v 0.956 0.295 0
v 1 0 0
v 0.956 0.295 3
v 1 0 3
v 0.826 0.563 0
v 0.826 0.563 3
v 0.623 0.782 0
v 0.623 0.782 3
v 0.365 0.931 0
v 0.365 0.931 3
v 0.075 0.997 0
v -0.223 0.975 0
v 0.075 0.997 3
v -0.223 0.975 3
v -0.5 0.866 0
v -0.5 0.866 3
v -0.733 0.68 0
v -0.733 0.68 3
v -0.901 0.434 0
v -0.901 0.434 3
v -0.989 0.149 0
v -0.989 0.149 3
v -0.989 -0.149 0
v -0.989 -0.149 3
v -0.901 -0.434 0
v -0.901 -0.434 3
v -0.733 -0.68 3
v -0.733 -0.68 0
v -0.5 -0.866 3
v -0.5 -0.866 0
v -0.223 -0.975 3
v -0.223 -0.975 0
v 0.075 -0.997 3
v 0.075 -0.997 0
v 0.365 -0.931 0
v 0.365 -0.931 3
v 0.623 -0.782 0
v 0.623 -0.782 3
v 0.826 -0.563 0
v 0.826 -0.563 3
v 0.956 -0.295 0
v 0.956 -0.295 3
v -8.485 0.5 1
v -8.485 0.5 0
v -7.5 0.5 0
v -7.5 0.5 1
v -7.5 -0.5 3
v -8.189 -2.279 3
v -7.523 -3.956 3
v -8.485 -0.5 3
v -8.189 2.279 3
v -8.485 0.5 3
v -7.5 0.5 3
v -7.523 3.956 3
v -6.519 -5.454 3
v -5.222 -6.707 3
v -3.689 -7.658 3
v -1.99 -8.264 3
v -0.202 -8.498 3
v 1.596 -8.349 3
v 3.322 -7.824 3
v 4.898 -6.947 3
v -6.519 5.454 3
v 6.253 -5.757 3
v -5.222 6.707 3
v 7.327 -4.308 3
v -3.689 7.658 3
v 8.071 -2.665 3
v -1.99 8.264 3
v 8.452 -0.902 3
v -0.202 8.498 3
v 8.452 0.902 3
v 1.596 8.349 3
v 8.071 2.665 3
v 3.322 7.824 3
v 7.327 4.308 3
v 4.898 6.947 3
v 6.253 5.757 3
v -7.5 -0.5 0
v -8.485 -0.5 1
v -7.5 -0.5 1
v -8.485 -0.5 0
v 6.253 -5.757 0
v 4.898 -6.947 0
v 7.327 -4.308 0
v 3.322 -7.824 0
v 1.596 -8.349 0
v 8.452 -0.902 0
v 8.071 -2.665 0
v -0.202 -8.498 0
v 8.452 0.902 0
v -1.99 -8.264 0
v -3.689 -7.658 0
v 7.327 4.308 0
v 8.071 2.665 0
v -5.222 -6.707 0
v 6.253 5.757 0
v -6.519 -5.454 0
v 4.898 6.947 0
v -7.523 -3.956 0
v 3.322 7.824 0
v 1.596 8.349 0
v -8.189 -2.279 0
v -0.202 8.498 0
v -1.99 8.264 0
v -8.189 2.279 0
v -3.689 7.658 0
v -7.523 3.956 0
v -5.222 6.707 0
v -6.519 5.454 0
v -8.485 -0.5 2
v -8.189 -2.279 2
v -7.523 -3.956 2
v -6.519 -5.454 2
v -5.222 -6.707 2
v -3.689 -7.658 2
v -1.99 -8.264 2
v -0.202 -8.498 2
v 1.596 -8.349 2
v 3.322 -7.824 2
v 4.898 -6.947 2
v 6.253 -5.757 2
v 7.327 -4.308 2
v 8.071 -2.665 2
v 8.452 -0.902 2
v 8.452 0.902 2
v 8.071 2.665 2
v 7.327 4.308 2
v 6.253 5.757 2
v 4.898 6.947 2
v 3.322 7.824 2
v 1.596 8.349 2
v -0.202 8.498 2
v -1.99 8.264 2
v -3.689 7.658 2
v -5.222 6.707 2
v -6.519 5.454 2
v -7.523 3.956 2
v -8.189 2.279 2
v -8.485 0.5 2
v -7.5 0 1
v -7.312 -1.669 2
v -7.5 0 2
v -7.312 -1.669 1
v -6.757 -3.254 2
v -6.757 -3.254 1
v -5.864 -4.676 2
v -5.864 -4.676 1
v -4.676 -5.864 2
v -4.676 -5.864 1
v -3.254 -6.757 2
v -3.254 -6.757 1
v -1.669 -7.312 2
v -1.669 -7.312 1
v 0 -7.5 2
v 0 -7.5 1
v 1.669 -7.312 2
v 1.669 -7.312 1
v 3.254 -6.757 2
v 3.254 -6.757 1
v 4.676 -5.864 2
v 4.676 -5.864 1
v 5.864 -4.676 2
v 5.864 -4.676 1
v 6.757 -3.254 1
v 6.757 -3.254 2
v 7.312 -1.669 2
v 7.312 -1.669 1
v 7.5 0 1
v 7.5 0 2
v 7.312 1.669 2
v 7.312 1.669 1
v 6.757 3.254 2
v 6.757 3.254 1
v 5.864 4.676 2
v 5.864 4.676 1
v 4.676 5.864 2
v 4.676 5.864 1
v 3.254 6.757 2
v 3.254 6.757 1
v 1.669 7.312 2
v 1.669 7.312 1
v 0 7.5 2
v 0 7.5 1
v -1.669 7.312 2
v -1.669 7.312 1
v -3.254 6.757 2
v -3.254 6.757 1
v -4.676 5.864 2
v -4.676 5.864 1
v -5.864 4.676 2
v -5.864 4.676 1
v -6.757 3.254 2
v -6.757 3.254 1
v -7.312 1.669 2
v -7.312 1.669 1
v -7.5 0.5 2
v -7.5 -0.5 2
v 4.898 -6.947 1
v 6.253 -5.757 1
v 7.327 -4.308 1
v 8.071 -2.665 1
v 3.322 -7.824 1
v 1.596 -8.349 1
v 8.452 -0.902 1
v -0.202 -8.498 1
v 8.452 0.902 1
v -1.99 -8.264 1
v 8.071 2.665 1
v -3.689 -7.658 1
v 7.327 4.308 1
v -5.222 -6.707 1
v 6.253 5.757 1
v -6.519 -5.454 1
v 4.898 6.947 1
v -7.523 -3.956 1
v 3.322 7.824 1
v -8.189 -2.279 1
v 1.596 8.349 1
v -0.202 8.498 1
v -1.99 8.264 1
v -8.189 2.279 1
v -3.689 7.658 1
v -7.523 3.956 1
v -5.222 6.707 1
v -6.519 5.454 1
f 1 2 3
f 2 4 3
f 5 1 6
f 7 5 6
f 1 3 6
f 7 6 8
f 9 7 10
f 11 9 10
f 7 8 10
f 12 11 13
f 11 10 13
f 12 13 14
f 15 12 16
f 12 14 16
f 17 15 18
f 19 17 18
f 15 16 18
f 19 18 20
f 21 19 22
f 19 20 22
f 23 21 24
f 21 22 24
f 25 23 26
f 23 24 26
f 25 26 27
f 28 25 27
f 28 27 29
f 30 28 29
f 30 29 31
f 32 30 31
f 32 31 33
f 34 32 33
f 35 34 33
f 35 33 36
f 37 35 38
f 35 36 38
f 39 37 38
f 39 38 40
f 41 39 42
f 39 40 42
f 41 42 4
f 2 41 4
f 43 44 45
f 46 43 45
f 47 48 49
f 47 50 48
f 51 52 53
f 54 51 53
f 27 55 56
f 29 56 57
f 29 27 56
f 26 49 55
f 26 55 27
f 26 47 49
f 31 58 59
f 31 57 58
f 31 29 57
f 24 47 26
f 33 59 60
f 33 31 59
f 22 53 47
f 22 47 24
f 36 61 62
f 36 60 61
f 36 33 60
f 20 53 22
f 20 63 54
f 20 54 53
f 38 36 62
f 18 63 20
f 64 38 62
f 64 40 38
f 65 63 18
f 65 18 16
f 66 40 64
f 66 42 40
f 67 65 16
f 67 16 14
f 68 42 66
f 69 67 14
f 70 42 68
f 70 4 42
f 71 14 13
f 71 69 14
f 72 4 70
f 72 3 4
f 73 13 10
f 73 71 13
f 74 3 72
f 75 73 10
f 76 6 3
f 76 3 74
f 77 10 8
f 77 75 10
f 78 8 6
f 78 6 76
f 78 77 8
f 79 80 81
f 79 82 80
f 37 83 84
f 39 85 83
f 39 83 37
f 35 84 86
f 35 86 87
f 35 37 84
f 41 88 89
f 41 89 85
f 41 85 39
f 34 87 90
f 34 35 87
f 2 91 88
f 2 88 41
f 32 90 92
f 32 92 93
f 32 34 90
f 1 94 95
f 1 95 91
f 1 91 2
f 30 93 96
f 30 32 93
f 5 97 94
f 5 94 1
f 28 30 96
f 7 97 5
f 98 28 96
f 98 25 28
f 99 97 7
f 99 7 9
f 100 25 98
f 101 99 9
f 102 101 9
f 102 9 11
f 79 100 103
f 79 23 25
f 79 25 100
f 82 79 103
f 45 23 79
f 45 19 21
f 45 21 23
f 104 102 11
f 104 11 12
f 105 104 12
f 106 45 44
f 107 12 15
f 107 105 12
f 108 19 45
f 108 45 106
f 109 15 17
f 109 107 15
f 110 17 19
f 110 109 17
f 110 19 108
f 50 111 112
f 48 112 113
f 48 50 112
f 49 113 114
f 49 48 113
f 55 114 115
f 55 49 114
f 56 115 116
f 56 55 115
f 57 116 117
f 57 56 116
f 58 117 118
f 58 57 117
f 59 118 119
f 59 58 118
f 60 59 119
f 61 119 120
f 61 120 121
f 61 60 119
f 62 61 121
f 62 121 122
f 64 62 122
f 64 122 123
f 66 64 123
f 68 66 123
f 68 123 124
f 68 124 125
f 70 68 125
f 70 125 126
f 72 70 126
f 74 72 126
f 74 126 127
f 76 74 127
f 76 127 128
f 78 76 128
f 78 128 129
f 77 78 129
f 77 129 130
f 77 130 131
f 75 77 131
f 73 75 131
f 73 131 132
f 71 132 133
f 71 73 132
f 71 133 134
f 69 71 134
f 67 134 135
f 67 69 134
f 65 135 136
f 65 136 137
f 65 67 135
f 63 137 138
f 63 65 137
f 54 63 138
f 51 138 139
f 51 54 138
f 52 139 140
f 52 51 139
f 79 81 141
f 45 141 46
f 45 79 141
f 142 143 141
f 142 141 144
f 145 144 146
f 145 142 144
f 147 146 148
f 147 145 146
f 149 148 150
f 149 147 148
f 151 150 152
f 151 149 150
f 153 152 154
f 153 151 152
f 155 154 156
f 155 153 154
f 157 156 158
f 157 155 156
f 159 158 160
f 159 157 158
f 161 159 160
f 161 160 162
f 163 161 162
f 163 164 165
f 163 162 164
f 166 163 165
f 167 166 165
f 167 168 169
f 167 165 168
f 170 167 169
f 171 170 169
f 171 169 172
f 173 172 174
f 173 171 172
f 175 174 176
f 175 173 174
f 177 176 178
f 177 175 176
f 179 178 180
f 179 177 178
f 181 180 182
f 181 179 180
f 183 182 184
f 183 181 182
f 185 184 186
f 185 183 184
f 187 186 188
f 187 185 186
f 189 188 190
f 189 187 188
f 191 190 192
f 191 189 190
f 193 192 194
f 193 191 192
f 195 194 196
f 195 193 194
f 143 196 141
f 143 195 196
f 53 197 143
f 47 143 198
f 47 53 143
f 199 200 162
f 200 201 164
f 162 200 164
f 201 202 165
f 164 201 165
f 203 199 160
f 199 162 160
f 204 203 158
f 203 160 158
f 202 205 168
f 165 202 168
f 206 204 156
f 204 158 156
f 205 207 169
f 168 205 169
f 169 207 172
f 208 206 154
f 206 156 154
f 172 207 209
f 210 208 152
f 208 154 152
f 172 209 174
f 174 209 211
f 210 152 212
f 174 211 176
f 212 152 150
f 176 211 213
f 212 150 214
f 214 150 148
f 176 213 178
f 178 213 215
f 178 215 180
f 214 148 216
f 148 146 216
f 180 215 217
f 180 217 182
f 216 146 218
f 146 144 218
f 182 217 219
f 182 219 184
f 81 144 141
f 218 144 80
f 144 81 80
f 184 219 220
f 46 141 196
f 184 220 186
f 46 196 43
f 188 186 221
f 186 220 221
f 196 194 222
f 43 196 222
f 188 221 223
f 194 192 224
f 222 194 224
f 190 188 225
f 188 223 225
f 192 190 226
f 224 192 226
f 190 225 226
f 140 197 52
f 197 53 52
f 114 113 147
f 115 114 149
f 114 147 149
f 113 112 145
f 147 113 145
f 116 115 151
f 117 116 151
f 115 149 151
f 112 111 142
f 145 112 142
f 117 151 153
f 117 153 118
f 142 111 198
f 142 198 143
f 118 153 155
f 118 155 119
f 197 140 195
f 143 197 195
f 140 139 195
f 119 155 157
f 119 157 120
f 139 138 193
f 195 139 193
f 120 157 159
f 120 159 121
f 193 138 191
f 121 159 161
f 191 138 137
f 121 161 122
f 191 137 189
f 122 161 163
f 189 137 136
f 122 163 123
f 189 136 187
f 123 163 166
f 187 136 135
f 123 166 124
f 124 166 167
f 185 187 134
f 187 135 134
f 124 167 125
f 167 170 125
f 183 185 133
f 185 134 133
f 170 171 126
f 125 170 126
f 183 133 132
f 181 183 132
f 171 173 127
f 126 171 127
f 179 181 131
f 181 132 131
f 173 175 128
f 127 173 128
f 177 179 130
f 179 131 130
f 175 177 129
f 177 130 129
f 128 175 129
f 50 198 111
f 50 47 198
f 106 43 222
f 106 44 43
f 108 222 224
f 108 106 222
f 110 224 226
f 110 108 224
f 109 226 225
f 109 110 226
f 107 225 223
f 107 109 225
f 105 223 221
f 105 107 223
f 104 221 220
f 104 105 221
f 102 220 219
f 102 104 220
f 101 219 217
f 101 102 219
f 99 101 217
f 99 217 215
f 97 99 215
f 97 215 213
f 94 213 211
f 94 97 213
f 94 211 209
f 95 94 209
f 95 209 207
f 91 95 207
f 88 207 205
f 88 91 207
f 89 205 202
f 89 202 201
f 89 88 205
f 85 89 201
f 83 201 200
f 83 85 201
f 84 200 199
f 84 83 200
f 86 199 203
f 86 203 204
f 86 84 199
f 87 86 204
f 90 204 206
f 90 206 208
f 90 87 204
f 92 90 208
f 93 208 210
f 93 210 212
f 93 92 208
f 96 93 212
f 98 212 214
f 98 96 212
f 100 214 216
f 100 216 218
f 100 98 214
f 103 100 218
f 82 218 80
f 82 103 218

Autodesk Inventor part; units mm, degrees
ref_plane "YZ Plane" through (0, 0, 0) normal (1, 0, 0) x (0, 1, 0)
ref_plane "XZ Plane" through (0, 0, 0) normal (0, 1, 0) x (-1, 0, 0)
ref_plane "XY Plane" through (0, 0, 0) normal (0, 0, 1) x (1, 0, 0)
sketch "Esboço1" plane through (0, 0, 0) normal (0, 0, 1) x (1, 0, 0)
  circle A0 centre (0, 0) radius 5
  dimension "d0" = 10
extrude "Extrusão1" add sketch "Esboço1" along normal blind 1
sketch "Esboço2" plane through (0, 0, 1) normal (0, 0, 1) x (1, 0, 0)
  circle A0 centre (0, 0) radius 4
  dimension "d3" = 8
extrude "Extrusão2" add sketch "Esboço2" along normal blind 1
sketch "Esboço3" plane through (0, 0, 2) normal (0, 0, 1) x (1, 0, 0)
  circle A0 centre (0, 0) radius 5
  dimension "d6" = 10
extrude "Extrusão3" add sketch "Esboço3" along normal blind 1
sketch "Esboço4" plane through (0, 0, 3) normal (0, 0, 1) x (1, 0, 0)
  circle A0 centre (0, 0) radius 4 projected
  circle A1 centre (0, 0) radius 1
  dimension "d9" = 2
extrude "Extrusão4" cut sketch "Esboço4" against normal blind 4 contours A1
thread "Rosca1" size "M2x0.4" class "6H" standard "ANSI Metric M Profile" full length
sketch "Esboço5" plane through (0, 0, 3) normal (0, 0, 1) x (1, 0, 0)
  circle A0 centre (0, 0) radius 5 projected
  line L0 (-4, 0) -> (-4, -0.5)
  circle A1 centre (0, 0) radius 4 projected
  line L1 (-4, 0) -> (-3.5, 0) construction
  line L2 (-4, -0.5) -> (-5, -0.5)
  line L3 (-5, -0.5) -> (-5, 0.5)
  line L4 (-5, -0.5) -> (-4, -0.5) construction
  line L5 (-5, 0.5) -> (-4, 0.5)
  line L6 (-4, 0.5) -> (-4, 0)
  line L7 (-4, -0.5) -> (-5, -0.5)
  dimension "d15" = 0.5
  dimension "d16" = 90
  dimension "d17" = 1
  dimension "d18" = 90
extrude "Extrusão5" cut sketch "Esboço5" against normal blind 10 contours L5 L6 L0 L2 A0 | A0 L3 L5 | L2 L3 A0 picked at (-4.3296, -0.2779)
sketch "Esboço7" plane through (0, 0, 3) normal (0, 0, 1) x (1, 0, 0)
  circle A0 centre (0, 0) radius 1 projected
  circle A1 centre (0, 0) radius 1
  circle A2 centre (0, 0) radius 8.5
  line L0 (-8.5, 0) -> (-7.5, 0)
  line L1 (-7.5, 0) -> (-7.5, -0.5)
  line L2 (-7.5, -0.5) -> (-8.4853, -0.5)
  line L3 (-7.5, 0) -> (-7.5, 0.5)
  line L4 (-7.5, 0.5) -> (-8.4853, 0.5)
  dimension "d21" = 17
  dimension "d22" = 1
  dimension "d23" = 0.5
  dimension "d24" = 0.5
extrude "Extrusão6" add sketch "Esboço7" against normal blind 1 contours A2 L2 L1 L3 L4
sketch "Esboço8" plane through (0, 0, 2) normal (0, 0, -1) x (-1, 0, 0)
  circle A0 centre (0, 0) radius 1
  circle A1 centre (0, 0) radius 1 projected
  circle A2 centre (0, 0) radius 7.5
  dimension "d27" = 15
extrude "Extrusão7" add sketch "Esboço8" along normal blind 1
sketch "Esboço9" plane through (0, 0, 0) normal (0, 0, -1) x (-1, 0, 0)
  circle A0 centre (0, 0) radius 1
  circle A1 centre (0, 0) radius 8.5
  line L0 (8.4853, -0.5) -> (7.5, -0.5) projected
  line L1 (7.5, 0) -> (7.5, -0.5)
  line L2 (7.5, -0.5) -> (8.4853, -0.5)
  line L3 (8.4853, -0.5) -> (8.4853, 0.5)
  line L4 (8.4853, 0.5) -> (7.5, 0.5) projected
  line L5 (7.5, 0.5) -> (8.4853, 0.5)
  line L6 (7.5, -0.5) -> (7.5, 0.5)
extrude "Extrusão8" add sketch "Esboço9" against normal blind 1 contours L4 L6 L1 L0 A1
properties part number "Polia2"
